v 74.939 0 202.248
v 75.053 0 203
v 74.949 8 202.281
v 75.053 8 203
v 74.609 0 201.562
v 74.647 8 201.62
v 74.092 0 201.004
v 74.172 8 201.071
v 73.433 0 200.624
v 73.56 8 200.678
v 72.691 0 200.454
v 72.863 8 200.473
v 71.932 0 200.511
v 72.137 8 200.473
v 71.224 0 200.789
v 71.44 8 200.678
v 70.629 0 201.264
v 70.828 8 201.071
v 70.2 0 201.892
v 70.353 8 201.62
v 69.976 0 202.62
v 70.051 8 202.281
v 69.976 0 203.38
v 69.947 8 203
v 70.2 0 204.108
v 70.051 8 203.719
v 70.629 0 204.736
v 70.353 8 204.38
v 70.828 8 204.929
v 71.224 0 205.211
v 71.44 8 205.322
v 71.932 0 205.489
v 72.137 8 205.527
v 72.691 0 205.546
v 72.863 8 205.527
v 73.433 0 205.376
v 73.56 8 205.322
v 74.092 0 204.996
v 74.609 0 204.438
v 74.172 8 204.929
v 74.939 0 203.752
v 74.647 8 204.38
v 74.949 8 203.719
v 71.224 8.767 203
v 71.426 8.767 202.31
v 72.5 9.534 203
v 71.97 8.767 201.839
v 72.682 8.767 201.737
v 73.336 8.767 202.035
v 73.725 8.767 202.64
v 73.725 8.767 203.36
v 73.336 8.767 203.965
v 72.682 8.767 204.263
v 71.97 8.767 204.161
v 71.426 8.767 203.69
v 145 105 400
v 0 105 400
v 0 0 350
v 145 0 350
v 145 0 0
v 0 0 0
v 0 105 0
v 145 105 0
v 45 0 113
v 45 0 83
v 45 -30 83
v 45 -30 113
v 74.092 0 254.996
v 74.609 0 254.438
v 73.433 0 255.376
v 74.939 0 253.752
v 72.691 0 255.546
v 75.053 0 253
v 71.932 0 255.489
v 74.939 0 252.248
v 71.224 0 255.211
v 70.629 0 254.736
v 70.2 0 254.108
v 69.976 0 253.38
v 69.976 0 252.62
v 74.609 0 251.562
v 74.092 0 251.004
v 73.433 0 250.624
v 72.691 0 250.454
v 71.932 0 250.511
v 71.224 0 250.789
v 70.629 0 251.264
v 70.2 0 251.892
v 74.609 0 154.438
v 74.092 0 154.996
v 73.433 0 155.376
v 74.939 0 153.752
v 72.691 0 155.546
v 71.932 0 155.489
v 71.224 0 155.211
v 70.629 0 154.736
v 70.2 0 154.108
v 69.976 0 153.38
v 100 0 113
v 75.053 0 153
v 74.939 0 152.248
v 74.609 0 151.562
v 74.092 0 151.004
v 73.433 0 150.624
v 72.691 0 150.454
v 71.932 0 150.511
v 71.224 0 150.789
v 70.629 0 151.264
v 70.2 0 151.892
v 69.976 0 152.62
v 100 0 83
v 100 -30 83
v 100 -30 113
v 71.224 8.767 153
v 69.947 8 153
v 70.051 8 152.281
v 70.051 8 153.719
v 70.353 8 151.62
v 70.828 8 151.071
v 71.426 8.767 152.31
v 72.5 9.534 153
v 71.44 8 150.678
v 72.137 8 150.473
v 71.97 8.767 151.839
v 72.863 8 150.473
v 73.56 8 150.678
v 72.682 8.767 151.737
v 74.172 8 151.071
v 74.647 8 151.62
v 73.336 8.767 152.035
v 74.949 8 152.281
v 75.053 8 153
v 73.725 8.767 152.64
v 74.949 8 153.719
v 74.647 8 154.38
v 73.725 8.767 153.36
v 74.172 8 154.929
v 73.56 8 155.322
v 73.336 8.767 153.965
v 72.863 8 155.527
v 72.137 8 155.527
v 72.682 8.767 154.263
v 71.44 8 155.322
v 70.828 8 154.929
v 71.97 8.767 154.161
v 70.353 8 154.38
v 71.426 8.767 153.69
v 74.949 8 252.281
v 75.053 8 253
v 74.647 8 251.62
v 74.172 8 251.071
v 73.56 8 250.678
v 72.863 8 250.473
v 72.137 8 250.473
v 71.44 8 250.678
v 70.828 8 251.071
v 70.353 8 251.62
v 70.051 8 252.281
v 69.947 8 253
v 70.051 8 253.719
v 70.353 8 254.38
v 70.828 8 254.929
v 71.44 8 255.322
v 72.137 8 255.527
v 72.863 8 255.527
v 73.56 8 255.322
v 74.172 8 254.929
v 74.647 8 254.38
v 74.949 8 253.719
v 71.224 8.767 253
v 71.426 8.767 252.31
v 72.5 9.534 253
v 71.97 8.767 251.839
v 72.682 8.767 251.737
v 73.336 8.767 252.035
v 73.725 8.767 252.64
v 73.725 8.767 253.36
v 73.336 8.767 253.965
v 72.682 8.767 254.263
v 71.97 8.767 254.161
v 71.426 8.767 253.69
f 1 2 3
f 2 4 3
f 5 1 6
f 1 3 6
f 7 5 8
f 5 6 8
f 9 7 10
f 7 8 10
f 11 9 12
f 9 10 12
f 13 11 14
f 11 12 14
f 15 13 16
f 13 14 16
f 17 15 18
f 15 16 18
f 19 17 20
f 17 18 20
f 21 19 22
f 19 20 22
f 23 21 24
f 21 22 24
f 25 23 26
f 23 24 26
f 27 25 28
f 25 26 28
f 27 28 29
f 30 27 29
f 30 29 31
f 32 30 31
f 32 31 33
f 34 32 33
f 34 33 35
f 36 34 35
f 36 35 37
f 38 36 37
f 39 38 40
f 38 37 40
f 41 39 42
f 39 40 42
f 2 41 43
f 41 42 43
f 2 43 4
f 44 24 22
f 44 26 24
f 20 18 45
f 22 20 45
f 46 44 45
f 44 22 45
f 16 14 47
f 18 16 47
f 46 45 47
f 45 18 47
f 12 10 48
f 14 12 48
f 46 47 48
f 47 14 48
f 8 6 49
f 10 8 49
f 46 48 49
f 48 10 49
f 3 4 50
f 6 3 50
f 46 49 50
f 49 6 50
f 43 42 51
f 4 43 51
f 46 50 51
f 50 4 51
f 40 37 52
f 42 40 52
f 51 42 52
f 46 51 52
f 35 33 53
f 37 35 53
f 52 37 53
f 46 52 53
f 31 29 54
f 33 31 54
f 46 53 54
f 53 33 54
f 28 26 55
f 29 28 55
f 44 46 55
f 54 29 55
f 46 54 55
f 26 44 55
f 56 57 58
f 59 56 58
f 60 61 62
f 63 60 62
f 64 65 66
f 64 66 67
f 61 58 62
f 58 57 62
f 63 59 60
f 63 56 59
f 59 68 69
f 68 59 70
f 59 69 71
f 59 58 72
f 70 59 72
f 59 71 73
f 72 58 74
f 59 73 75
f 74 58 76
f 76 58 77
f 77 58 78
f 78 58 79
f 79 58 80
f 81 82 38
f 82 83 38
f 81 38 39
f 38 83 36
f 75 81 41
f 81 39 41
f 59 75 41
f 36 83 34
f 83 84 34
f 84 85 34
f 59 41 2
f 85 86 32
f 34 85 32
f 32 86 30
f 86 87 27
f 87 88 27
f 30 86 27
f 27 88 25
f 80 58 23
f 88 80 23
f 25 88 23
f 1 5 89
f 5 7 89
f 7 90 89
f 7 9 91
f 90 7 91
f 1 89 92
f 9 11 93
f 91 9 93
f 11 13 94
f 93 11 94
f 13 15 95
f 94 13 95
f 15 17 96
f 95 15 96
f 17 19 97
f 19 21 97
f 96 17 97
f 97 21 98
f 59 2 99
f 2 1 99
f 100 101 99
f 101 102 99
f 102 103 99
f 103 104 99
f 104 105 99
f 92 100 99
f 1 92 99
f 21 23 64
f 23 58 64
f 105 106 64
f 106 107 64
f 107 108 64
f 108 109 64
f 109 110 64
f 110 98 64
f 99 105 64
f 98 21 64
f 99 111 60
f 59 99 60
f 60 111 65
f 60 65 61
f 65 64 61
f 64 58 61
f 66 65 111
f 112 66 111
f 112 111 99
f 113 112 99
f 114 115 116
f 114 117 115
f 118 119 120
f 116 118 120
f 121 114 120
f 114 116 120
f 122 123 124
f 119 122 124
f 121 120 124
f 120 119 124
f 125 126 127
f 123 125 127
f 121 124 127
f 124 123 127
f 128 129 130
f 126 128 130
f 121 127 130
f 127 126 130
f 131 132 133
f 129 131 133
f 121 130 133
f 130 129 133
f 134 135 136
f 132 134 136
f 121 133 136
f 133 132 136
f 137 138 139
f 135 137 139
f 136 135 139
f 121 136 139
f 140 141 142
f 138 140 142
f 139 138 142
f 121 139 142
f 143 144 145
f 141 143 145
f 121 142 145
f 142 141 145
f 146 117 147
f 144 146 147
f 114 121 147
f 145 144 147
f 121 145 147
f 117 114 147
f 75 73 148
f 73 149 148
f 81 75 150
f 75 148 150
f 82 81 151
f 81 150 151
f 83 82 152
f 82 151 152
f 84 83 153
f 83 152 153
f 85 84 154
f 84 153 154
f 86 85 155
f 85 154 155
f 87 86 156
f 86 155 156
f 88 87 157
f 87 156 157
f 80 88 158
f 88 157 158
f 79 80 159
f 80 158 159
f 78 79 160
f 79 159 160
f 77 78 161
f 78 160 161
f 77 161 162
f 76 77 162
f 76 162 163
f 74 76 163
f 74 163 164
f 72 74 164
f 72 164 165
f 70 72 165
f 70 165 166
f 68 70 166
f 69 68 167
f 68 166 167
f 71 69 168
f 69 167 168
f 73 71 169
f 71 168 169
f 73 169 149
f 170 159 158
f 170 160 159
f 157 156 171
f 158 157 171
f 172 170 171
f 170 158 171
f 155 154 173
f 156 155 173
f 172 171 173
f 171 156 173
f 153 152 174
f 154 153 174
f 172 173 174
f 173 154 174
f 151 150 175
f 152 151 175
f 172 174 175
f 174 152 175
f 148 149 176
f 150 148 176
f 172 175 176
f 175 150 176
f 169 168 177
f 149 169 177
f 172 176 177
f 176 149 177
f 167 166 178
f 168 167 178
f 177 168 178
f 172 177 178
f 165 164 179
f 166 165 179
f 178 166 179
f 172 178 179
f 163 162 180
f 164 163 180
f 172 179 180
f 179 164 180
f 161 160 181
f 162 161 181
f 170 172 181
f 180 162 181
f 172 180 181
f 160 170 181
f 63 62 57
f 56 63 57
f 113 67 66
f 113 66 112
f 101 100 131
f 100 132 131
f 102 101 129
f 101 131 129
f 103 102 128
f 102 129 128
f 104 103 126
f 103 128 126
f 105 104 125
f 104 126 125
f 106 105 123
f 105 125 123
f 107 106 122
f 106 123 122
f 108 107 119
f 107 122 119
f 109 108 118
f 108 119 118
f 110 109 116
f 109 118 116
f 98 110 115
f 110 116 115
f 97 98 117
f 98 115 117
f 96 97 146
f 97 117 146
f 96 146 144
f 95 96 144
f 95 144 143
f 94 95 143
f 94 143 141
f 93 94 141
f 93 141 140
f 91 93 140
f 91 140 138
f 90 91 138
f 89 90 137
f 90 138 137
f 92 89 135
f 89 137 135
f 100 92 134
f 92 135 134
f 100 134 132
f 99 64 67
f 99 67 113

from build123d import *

# Parameters (mm, degrees)
BOSS_EXTRUDE1_DEPTH             = 145
TAP_DRILL_FOR_1_4_20_TAP1_D     = 5.1054
TAP_DRILL_FOR_1_4_20_TAP1_DEPTH = 8
TAP_DRILL_FOR_1_4_20_TAP1_TIP   = 1.533816902
SKETCH4_W                       = 55
SKETCH4_H                       = 30
BOSS_EXTRUDE2_DEPTH             = 30


with BuildPart() as part:
    # Sketch1 → Boss-Extrude1 (new body)
    with BuildSketch(Plane(origin=(0, 0, 0), x_dir=(0, 0, -1), z_dir=(1, 0, 0))):
        Polygon((-350, 0), (0, 0), (0, 105), (-400, 105), align=None)
    extrude(amount=BOSS_EXTRUDE1_DEPTH)

    # Tap Drill for 1/4-20 Tap1
    with Locations(Plane(origin=(0, 0, 0), x_dir=(-1, 0, 0), z_dir=(0, -1, 0))):
        with Locations((-72.5, -253), (-72.5, -203), (-72.5, -153)):
            Hole(TAP_DRILL_FOR_1_4_20_TAP1_D / 2, depth=TAP_DRILL_FOR_1_4_20_TAP1_DEPTH)
            with Locations((0, 0, -(TAP_DRILL_FOR_1_4_20_TAP1_DEPTH + TAP_DRILL_FOR_1_4_20_TAP1_TIP / 2))):  # 118° drill point
                Cone(0, TAP_DRILL_FOR_1_4_20_TAP1_D / 2, TAP_DRILL_FOR_1_4_20_TAP1_TIP, mode=Mode.SUBTRACT)

    # Sketch4 → Boss-Extrude2 (add)
    with BuildSketch(Plane.XZ):
        with Locations((72.5, 98)):
            Rectangle(SKETCH4_W, SKETCH4_H)
    extrude(amount=BOSS_EXTRUDE2_DEPTH)


solid = part.part
